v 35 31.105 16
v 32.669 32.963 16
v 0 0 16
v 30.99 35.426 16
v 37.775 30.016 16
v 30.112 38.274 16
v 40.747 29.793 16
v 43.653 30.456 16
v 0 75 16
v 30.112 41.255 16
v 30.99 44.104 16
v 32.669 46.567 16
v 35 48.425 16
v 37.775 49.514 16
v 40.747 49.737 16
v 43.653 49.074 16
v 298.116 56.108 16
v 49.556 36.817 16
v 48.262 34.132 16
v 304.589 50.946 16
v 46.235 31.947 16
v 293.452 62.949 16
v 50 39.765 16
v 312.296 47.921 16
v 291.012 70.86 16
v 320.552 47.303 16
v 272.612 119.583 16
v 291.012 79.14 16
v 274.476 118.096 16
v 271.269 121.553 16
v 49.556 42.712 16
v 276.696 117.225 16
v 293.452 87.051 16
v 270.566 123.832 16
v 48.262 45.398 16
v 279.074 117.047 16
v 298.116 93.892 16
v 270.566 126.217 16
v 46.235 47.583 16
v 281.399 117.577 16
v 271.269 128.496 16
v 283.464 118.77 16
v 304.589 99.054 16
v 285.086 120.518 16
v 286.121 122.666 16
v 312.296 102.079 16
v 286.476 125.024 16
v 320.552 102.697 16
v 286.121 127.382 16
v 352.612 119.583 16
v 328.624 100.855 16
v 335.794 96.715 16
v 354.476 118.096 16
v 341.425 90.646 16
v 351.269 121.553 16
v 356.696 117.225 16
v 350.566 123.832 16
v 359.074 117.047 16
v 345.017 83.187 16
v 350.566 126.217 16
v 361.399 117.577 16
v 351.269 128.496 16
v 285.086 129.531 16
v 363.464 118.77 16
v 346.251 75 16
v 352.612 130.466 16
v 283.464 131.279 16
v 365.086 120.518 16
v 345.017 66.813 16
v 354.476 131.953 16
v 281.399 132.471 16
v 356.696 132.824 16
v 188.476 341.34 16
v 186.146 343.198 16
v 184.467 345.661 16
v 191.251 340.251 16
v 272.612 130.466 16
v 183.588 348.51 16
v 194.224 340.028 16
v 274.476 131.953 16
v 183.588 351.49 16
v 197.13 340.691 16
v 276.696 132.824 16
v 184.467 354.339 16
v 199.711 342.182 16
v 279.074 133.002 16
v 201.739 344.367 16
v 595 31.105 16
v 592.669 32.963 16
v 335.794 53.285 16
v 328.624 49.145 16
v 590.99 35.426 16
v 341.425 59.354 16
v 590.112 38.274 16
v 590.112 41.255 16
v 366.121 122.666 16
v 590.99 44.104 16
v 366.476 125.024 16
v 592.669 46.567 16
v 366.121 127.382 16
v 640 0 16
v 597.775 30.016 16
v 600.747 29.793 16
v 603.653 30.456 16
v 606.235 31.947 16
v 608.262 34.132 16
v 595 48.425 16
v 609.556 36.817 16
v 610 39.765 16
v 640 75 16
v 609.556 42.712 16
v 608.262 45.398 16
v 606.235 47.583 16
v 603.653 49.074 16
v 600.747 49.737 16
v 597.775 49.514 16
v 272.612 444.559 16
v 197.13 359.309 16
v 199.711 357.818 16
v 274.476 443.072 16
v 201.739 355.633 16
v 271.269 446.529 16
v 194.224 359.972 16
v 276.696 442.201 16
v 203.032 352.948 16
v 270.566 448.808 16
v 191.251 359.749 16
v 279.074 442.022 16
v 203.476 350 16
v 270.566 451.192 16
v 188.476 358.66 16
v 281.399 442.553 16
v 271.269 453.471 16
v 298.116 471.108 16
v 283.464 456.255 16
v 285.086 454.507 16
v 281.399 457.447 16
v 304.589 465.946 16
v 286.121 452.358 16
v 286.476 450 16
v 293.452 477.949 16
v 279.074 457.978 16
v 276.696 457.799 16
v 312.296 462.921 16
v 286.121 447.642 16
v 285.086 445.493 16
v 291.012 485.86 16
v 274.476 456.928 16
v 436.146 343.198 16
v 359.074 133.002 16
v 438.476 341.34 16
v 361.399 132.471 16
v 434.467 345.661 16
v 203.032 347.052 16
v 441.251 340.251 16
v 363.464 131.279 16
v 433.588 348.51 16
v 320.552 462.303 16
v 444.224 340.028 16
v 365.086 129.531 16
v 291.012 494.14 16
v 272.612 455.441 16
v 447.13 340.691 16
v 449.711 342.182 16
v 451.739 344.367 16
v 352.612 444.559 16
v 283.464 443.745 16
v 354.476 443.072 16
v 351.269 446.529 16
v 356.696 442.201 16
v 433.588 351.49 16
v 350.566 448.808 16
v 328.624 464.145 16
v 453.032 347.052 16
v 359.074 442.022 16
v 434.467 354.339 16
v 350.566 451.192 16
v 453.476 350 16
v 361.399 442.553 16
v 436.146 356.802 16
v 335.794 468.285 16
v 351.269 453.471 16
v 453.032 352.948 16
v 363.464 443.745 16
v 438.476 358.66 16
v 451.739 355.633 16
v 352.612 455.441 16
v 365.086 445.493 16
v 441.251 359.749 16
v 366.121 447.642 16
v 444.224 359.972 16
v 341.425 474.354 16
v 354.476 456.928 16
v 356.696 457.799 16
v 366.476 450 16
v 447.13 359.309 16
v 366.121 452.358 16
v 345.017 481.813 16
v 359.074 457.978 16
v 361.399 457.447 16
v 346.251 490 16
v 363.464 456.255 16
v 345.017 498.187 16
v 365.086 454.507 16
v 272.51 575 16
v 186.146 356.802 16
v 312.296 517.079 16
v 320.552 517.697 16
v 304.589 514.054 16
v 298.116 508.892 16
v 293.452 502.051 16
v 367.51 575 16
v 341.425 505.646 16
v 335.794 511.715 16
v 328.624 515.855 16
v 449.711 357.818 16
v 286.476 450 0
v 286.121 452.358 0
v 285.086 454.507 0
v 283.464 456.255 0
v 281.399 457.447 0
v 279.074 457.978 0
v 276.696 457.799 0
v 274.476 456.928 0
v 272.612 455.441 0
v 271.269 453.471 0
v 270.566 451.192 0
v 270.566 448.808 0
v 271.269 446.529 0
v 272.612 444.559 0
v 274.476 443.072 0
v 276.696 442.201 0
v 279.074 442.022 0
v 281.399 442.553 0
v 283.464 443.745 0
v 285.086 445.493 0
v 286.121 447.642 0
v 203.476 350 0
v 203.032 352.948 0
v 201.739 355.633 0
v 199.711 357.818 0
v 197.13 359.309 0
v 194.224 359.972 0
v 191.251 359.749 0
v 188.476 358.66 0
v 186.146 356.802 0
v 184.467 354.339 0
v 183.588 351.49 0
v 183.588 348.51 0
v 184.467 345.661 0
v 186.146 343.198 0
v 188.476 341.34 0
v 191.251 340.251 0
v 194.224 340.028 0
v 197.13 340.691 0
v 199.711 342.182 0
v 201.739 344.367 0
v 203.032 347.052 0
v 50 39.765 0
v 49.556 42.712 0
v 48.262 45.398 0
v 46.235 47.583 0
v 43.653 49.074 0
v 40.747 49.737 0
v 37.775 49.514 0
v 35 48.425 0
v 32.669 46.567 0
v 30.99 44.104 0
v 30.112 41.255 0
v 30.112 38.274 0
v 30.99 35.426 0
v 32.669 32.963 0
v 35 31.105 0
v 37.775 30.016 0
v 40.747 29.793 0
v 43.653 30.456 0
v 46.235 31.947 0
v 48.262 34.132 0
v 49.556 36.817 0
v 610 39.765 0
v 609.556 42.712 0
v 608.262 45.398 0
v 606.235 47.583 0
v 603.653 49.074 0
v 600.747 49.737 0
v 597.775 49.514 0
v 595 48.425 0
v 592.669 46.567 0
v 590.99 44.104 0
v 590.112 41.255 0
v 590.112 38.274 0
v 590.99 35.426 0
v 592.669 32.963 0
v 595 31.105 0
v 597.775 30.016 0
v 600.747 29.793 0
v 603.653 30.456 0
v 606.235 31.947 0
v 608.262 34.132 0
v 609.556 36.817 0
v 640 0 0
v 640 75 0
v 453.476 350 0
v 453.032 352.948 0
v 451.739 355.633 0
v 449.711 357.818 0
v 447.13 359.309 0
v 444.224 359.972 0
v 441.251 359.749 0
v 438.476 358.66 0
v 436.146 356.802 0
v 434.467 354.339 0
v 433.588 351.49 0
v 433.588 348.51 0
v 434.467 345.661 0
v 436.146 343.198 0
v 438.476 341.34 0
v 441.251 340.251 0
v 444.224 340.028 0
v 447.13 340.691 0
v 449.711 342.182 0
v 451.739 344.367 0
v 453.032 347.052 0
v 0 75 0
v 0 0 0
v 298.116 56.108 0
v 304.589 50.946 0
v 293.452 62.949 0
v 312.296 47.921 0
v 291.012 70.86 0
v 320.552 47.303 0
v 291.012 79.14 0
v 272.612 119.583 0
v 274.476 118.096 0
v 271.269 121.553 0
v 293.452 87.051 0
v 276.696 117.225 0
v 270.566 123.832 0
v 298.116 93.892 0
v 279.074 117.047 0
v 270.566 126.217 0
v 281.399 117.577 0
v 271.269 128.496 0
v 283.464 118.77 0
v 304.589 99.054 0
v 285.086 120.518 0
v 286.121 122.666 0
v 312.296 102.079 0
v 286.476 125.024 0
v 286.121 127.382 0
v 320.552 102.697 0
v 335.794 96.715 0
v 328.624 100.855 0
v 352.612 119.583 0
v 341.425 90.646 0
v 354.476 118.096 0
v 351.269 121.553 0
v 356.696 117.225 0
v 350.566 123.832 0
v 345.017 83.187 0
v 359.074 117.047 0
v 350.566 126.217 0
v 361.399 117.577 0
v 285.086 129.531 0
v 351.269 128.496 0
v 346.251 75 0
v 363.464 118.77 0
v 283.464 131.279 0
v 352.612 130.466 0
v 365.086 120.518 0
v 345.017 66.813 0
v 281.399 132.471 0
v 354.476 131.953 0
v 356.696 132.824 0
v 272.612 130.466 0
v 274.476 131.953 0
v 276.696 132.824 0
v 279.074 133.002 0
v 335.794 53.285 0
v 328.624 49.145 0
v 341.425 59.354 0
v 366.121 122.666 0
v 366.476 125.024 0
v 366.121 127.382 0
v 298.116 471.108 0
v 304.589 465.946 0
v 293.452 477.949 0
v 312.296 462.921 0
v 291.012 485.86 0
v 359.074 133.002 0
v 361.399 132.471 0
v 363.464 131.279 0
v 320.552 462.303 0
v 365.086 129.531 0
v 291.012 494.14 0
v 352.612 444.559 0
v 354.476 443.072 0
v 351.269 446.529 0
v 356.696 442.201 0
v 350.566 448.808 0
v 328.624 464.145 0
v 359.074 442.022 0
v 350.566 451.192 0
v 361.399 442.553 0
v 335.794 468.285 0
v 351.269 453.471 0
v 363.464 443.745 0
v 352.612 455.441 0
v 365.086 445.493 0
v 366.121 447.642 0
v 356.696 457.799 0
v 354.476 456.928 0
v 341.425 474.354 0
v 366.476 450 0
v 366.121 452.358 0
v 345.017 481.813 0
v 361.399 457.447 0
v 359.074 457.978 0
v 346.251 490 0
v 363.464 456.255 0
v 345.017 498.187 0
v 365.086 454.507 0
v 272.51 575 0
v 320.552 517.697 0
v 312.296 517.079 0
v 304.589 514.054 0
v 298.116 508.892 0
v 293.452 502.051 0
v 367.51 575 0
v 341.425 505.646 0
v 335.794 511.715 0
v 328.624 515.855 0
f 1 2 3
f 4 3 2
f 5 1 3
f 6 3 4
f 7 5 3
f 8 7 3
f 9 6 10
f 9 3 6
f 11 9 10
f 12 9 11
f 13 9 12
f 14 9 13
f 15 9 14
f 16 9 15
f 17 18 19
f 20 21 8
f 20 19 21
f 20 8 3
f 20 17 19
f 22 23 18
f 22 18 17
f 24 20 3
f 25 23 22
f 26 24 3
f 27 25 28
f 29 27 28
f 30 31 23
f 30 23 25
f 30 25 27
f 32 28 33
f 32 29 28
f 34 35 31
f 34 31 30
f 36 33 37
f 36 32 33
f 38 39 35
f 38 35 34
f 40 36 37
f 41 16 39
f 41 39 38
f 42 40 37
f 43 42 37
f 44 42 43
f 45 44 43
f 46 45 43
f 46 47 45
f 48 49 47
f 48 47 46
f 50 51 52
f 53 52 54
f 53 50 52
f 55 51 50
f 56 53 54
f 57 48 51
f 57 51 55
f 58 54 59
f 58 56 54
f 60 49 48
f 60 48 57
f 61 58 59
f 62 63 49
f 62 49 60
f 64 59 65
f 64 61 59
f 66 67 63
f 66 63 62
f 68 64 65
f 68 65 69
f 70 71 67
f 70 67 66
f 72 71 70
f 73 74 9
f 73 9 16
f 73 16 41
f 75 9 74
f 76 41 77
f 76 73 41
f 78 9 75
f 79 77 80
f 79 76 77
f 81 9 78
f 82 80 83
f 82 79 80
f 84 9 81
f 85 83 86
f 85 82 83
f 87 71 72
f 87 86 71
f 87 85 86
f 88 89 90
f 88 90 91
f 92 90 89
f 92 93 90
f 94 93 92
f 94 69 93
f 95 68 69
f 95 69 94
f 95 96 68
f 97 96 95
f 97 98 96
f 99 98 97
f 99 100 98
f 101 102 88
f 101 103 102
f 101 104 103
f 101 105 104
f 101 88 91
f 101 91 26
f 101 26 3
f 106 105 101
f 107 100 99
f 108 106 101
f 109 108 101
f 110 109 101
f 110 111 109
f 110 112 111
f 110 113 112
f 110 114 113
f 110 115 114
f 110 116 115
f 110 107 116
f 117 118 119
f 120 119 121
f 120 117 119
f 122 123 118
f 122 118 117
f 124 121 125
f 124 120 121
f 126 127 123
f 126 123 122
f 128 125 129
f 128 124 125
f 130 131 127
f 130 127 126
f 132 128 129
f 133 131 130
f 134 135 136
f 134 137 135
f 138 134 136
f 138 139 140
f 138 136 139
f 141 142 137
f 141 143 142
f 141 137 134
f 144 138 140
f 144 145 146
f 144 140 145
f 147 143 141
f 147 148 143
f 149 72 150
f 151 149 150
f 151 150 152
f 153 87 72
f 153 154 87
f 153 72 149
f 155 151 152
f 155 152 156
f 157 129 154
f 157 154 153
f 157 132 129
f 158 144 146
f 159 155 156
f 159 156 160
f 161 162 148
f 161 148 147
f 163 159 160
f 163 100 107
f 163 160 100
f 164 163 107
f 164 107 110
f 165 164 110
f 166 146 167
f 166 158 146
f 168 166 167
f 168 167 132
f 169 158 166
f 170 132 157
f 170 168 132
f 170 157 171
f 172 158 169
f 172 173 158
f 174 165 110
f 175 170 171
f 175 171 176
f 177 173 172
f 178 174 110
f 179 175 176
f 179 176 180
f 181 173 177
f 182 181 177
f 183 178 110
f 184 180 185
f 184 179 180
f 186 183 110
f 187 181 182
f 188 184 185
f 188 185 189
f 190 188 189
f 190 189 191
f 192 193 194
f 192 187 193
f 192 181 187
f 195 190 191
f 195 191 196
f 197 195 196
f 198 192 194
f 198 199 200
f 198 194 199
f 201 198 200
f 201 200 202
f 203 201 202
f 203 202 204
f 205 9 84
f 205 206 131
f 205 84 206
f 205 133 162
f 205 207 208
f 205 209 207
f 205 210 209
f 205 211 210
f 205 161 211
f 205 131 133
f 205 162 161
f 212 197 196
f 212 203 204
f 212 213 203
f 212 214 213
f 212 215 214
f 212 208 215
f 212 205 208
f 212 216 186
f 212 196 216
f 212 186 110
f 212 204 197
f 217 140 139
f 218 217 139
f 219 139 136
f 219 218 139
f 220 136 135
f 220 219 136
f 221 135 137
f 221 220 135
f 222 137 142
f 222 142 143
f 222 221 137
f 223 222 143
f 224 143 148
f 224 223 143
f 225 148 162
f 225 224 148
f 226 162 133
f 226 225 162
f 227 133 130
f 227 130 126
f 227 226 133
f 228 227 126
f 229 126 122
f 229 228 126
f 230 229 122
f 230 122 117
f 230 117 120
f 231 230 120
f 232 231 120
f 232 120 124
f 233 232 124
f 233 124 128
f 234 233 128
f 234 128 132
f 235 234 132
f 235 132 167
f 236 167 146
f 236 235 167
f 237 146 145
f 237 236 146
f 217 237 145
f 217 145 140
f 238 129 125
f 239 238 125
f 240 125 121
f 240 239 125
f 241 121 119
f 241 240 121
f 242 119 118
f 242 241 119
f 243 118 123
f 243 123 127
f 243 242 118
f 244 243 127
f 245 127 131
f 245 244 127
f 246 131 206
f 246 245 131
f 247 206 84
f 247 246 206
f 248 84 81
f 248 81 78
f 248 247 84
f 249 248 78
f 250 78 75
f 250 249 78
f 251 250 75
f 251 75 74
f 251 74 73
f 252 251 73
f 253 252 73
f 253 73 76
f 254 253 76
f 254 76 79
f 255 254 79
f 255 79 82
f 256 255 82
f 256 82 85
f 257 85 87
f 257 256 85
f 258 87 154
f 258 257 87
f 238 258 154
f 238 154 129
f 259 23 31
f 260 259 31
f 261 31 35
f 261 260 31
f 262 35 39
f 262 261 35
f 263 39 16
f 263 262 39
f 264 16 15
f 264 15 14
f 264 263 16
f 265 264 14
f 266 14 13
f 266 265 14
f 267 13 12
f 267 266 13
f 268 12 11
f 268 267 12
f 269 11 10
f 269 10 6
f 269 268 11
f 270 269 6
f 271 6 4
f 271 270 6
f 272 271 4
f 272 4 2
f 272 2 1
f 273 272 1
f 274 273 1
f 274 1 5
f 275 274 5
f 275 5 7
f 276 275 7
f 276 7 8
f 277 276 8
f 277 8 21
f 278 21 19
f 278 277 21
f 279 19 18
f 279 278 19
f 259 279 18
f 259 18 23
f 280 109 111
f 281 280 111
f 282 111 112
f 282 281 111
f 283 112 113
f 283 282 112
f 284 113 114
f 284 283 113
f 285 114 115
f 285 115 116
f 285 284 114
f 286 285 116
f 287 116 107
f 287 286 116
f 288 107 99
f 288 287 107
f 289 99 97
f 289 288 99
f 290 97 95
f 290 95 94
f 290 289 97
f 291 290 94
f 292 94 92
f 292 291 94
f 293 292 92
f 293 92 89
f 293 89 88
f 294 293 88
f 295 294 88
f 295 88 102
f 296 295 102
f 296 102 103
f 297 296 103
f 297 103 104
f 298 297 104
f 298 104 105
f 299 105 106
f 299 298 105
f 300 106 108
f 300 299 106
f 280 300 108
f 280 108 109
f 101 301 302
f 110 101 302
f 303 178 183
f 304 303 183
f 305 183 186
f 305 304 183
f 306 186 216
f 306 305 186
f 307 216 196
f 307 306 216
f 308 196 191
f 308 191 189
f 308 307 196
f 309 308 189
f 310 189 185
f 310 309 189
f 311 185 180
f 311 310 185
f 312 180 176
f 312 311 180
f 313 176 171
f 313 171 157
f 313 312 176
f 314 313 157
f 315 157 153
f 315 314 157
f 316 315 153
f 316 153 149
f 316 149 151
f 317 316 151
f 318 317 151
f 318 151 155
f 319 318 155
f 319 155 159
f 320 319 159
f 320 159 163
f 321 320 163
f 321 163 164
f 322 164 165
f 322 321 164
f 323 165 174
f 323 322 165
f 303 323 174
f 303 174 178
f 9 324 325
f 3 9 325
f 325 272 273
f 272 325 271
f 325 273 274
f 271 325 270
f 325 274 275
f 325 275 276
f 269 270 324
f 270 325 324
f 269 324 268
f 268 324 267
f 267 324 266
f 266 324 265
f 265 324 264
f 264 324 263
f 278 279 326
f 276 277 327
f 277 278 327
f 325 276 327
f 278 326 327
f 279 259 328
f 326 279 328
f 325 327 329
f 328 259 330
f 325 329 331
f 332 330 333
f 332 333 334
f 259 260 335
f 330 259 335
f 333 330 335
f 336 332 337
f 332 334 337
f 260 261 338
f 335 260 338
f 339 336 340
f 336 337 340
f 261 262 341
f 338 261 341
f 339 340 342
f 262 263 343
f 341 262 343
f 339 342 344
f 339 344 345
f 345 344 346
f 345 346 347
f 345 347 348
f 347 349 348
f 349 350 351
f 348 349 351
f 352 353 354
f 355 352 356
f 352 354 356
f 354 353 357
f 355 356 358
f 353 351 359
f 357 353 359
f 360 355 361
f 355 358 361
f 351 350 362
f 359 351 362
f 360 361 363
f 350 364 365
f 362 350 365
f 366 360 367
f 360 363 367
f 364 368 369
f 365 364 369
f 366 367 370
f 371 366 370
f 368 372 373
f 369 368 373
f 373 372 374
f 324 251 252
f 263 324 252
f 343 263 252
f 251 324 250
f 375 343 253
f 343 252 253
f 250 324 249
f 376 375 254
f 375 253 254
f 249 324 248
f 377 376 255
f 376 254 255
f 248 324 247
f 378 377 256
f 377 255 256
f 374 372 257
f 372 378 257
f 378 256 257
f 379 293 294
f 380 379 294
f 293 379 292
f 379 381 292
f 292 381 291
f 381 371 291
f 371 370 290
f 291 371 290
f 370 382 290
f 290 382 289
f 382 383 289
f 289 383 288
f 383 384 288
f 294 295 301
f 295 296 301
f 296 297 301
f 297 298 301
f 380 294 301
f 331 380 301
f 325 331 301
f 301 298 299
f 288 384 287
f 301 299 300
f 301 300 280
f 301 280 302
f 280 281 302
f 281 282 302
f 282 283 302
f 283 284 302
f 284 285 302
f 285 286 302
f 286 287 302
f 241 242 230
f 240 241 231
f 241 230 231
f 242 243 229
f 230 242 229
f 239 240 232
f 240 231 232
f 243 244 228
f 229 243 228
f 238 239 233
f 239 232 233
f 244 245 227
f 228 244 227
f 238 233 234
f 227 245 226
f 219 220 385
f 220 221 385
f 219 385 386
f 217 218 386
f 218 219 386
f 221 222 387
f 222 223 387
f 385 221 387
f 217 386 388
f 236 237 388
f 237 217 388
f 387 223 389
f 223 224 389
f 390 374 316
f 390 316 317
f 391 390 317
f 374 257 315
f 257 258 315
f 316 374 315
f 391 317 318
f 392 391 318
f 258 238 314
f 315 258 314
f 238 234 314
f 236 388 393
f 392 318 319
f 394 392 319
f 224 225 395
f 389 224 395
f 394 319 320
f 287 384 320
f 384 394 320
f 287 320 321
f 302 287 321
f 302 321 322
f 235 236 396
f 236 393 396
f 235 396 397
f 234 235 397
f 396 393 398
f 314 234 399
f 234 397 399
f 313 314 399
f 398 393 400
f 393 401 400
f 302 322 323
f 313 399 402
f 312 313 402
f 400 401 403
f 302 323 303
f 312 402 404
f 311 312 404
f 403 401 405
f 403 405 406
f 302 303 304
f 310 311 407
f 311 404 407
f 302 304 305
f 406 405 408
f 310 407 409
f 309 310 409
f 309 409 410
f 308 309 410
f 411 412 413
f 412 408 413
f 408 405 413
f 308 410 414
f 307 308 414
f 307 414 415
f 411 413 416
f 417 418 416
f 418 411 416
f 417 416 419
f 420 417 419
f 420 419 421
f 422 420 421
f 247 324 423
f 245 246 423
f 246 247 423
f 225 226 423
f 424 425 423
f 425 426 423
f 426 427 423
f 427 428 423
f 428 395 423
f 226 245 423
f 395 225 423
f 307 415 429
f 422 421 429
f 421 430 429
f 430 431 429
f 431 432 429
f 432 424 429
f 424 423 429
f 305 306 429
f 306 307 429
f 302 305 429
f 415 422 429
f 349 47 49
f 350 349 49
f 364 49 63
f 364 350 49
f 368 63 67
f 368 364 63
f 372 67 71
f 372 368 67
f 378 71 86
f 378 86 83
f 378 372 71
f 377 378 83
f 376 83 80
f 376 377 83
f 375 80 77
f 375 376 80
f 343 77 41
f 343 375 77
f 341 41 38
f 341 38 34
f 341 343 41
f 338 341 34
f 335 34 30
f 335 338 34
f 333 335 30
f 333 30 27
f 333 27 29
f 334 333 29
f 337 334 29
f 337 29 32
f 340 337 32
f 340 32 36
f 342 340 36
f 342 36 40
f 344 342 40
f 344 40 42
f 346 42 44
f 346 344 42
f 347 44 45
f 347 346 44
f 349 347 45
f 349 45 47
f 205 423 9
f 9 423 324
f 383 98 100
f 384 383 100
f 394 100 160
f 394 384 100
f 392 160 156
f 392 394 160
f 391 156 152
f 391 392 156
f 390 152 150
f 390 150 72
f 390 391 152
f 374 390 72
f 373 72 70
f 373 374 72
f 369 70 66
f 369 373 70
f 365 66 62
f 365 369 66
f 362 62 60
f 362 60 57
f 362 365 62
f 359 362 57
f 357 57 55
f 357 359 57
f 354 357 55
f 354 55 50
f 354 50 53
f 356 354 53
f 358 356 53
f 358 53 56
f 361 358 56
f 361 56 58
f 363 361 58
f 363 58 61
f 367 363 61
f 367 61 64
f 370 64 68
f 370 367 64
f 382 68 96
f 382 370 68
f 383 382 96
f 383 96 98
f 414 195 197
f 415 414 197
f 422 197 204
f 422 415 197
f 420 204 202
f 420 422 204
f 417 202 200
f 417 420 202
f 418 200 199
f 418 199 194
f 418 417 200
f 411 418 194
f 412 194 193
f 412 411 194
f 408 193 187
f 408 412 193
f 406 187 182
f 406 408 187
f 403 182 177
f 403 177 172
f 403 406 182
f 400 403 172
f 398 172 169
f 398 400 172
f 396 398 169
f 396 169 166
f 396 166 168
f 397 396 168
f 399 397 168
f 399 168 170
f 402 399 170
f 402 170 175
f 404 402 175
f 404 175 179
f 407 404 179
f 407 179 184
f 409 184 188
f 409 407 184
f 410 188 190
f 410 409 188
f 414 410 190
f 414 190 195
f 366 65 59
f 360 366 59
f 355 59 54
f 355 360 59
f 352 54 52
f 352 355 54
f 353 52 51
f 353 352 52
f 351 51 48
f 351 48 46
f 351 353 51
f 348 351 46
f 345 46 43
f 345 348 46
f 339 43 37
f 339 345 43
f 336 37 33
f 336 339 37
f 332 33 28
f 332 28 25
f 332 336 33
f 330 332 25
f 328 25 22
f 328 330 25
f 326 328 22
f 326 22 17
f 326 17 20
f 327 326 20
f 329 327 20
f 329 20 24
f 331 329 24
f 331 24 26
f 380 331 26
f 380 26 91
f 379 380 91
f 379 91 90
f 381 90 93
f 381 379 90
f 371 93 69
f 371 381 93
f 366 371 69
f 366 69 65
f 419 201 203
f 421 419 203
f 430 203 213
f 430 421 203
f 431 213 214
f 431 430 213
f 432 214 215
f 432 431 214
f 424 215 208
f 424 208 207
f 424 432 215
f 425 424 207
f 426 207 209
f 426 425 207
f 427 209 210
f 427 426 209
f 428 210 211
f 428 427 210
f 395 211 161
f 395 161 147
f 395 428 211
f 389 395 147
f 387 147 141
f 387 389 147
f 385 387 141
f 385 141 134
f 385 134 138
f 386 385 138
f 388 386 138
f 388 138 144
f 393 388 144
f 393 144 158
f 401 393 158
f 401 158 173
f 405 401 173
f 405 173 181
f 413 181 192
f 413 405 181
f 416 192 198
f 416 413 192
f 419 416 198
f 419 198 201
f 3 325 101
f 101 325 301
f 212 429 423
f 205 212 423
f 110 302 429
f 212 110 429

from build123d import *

# Parameters (mm, degrees)
SKETCH2_R           = 27.775
SKETCH2_R_2         = 8
SKETCH2_R_3         = 10
BOSS_EXTRUDE1_DEPTH = 16


with BuildPart() as part:
    # Sketch2 → Boss-Extrude1 (new body)
    with BuildSketch(Plane.XY):
        Polygon((0, 0), (640, 0), (640, 75), (367.510391728, 575), (272.510391728, 575), (0, 75), align=None)
        with Locations((318.4763261, 490)):
            Circle(SKETCH2_R, mode=Mode.SUBTRACT)
        with Locations((278.4763261, 450)):
            Circle(SKETCH2_R_2, mode=Mode.SUBTRACT)
        with Locations((358.4763261, 450)):
            Circle(SKETCH2_R_2, mode=Mode.SUBTRACT)
        with Locations((193.4763261, 350)):
            Circle(SKETCH2_R_3, mode=Mode.SUBTRACT)
        with Locations((443.4763261, 350)):
            Circle(SKETCH2_R_3, mode=Mode.SUBTRACT)
        with Locations((278.4763261, 125.024449421)):
            Circle(SKETCH2_R_2, mode=Mode.SUBTRACT)
        with Locations((358.4763261, 125.024449421)):
            Circle(SKETCH2_R_2, mode=Mode.SUBTRACT)
        with Locations((318.4763261, 75)):
            Circle(SKETCH2_R, mode=Mode.SUBTRACT)
        with Locations((40, 39.764905221)):
            Circle(SKETCH2_R_3, mode=Mode.SUBTRACT)
        with Locations((600, 39.764905221)):
            Circle(SKETCH2_R_3, mode=Mode.SUBTRACT)
    extrude(amount=BOSS_EXTRUDE1_DEPTH)


solid = part.part
